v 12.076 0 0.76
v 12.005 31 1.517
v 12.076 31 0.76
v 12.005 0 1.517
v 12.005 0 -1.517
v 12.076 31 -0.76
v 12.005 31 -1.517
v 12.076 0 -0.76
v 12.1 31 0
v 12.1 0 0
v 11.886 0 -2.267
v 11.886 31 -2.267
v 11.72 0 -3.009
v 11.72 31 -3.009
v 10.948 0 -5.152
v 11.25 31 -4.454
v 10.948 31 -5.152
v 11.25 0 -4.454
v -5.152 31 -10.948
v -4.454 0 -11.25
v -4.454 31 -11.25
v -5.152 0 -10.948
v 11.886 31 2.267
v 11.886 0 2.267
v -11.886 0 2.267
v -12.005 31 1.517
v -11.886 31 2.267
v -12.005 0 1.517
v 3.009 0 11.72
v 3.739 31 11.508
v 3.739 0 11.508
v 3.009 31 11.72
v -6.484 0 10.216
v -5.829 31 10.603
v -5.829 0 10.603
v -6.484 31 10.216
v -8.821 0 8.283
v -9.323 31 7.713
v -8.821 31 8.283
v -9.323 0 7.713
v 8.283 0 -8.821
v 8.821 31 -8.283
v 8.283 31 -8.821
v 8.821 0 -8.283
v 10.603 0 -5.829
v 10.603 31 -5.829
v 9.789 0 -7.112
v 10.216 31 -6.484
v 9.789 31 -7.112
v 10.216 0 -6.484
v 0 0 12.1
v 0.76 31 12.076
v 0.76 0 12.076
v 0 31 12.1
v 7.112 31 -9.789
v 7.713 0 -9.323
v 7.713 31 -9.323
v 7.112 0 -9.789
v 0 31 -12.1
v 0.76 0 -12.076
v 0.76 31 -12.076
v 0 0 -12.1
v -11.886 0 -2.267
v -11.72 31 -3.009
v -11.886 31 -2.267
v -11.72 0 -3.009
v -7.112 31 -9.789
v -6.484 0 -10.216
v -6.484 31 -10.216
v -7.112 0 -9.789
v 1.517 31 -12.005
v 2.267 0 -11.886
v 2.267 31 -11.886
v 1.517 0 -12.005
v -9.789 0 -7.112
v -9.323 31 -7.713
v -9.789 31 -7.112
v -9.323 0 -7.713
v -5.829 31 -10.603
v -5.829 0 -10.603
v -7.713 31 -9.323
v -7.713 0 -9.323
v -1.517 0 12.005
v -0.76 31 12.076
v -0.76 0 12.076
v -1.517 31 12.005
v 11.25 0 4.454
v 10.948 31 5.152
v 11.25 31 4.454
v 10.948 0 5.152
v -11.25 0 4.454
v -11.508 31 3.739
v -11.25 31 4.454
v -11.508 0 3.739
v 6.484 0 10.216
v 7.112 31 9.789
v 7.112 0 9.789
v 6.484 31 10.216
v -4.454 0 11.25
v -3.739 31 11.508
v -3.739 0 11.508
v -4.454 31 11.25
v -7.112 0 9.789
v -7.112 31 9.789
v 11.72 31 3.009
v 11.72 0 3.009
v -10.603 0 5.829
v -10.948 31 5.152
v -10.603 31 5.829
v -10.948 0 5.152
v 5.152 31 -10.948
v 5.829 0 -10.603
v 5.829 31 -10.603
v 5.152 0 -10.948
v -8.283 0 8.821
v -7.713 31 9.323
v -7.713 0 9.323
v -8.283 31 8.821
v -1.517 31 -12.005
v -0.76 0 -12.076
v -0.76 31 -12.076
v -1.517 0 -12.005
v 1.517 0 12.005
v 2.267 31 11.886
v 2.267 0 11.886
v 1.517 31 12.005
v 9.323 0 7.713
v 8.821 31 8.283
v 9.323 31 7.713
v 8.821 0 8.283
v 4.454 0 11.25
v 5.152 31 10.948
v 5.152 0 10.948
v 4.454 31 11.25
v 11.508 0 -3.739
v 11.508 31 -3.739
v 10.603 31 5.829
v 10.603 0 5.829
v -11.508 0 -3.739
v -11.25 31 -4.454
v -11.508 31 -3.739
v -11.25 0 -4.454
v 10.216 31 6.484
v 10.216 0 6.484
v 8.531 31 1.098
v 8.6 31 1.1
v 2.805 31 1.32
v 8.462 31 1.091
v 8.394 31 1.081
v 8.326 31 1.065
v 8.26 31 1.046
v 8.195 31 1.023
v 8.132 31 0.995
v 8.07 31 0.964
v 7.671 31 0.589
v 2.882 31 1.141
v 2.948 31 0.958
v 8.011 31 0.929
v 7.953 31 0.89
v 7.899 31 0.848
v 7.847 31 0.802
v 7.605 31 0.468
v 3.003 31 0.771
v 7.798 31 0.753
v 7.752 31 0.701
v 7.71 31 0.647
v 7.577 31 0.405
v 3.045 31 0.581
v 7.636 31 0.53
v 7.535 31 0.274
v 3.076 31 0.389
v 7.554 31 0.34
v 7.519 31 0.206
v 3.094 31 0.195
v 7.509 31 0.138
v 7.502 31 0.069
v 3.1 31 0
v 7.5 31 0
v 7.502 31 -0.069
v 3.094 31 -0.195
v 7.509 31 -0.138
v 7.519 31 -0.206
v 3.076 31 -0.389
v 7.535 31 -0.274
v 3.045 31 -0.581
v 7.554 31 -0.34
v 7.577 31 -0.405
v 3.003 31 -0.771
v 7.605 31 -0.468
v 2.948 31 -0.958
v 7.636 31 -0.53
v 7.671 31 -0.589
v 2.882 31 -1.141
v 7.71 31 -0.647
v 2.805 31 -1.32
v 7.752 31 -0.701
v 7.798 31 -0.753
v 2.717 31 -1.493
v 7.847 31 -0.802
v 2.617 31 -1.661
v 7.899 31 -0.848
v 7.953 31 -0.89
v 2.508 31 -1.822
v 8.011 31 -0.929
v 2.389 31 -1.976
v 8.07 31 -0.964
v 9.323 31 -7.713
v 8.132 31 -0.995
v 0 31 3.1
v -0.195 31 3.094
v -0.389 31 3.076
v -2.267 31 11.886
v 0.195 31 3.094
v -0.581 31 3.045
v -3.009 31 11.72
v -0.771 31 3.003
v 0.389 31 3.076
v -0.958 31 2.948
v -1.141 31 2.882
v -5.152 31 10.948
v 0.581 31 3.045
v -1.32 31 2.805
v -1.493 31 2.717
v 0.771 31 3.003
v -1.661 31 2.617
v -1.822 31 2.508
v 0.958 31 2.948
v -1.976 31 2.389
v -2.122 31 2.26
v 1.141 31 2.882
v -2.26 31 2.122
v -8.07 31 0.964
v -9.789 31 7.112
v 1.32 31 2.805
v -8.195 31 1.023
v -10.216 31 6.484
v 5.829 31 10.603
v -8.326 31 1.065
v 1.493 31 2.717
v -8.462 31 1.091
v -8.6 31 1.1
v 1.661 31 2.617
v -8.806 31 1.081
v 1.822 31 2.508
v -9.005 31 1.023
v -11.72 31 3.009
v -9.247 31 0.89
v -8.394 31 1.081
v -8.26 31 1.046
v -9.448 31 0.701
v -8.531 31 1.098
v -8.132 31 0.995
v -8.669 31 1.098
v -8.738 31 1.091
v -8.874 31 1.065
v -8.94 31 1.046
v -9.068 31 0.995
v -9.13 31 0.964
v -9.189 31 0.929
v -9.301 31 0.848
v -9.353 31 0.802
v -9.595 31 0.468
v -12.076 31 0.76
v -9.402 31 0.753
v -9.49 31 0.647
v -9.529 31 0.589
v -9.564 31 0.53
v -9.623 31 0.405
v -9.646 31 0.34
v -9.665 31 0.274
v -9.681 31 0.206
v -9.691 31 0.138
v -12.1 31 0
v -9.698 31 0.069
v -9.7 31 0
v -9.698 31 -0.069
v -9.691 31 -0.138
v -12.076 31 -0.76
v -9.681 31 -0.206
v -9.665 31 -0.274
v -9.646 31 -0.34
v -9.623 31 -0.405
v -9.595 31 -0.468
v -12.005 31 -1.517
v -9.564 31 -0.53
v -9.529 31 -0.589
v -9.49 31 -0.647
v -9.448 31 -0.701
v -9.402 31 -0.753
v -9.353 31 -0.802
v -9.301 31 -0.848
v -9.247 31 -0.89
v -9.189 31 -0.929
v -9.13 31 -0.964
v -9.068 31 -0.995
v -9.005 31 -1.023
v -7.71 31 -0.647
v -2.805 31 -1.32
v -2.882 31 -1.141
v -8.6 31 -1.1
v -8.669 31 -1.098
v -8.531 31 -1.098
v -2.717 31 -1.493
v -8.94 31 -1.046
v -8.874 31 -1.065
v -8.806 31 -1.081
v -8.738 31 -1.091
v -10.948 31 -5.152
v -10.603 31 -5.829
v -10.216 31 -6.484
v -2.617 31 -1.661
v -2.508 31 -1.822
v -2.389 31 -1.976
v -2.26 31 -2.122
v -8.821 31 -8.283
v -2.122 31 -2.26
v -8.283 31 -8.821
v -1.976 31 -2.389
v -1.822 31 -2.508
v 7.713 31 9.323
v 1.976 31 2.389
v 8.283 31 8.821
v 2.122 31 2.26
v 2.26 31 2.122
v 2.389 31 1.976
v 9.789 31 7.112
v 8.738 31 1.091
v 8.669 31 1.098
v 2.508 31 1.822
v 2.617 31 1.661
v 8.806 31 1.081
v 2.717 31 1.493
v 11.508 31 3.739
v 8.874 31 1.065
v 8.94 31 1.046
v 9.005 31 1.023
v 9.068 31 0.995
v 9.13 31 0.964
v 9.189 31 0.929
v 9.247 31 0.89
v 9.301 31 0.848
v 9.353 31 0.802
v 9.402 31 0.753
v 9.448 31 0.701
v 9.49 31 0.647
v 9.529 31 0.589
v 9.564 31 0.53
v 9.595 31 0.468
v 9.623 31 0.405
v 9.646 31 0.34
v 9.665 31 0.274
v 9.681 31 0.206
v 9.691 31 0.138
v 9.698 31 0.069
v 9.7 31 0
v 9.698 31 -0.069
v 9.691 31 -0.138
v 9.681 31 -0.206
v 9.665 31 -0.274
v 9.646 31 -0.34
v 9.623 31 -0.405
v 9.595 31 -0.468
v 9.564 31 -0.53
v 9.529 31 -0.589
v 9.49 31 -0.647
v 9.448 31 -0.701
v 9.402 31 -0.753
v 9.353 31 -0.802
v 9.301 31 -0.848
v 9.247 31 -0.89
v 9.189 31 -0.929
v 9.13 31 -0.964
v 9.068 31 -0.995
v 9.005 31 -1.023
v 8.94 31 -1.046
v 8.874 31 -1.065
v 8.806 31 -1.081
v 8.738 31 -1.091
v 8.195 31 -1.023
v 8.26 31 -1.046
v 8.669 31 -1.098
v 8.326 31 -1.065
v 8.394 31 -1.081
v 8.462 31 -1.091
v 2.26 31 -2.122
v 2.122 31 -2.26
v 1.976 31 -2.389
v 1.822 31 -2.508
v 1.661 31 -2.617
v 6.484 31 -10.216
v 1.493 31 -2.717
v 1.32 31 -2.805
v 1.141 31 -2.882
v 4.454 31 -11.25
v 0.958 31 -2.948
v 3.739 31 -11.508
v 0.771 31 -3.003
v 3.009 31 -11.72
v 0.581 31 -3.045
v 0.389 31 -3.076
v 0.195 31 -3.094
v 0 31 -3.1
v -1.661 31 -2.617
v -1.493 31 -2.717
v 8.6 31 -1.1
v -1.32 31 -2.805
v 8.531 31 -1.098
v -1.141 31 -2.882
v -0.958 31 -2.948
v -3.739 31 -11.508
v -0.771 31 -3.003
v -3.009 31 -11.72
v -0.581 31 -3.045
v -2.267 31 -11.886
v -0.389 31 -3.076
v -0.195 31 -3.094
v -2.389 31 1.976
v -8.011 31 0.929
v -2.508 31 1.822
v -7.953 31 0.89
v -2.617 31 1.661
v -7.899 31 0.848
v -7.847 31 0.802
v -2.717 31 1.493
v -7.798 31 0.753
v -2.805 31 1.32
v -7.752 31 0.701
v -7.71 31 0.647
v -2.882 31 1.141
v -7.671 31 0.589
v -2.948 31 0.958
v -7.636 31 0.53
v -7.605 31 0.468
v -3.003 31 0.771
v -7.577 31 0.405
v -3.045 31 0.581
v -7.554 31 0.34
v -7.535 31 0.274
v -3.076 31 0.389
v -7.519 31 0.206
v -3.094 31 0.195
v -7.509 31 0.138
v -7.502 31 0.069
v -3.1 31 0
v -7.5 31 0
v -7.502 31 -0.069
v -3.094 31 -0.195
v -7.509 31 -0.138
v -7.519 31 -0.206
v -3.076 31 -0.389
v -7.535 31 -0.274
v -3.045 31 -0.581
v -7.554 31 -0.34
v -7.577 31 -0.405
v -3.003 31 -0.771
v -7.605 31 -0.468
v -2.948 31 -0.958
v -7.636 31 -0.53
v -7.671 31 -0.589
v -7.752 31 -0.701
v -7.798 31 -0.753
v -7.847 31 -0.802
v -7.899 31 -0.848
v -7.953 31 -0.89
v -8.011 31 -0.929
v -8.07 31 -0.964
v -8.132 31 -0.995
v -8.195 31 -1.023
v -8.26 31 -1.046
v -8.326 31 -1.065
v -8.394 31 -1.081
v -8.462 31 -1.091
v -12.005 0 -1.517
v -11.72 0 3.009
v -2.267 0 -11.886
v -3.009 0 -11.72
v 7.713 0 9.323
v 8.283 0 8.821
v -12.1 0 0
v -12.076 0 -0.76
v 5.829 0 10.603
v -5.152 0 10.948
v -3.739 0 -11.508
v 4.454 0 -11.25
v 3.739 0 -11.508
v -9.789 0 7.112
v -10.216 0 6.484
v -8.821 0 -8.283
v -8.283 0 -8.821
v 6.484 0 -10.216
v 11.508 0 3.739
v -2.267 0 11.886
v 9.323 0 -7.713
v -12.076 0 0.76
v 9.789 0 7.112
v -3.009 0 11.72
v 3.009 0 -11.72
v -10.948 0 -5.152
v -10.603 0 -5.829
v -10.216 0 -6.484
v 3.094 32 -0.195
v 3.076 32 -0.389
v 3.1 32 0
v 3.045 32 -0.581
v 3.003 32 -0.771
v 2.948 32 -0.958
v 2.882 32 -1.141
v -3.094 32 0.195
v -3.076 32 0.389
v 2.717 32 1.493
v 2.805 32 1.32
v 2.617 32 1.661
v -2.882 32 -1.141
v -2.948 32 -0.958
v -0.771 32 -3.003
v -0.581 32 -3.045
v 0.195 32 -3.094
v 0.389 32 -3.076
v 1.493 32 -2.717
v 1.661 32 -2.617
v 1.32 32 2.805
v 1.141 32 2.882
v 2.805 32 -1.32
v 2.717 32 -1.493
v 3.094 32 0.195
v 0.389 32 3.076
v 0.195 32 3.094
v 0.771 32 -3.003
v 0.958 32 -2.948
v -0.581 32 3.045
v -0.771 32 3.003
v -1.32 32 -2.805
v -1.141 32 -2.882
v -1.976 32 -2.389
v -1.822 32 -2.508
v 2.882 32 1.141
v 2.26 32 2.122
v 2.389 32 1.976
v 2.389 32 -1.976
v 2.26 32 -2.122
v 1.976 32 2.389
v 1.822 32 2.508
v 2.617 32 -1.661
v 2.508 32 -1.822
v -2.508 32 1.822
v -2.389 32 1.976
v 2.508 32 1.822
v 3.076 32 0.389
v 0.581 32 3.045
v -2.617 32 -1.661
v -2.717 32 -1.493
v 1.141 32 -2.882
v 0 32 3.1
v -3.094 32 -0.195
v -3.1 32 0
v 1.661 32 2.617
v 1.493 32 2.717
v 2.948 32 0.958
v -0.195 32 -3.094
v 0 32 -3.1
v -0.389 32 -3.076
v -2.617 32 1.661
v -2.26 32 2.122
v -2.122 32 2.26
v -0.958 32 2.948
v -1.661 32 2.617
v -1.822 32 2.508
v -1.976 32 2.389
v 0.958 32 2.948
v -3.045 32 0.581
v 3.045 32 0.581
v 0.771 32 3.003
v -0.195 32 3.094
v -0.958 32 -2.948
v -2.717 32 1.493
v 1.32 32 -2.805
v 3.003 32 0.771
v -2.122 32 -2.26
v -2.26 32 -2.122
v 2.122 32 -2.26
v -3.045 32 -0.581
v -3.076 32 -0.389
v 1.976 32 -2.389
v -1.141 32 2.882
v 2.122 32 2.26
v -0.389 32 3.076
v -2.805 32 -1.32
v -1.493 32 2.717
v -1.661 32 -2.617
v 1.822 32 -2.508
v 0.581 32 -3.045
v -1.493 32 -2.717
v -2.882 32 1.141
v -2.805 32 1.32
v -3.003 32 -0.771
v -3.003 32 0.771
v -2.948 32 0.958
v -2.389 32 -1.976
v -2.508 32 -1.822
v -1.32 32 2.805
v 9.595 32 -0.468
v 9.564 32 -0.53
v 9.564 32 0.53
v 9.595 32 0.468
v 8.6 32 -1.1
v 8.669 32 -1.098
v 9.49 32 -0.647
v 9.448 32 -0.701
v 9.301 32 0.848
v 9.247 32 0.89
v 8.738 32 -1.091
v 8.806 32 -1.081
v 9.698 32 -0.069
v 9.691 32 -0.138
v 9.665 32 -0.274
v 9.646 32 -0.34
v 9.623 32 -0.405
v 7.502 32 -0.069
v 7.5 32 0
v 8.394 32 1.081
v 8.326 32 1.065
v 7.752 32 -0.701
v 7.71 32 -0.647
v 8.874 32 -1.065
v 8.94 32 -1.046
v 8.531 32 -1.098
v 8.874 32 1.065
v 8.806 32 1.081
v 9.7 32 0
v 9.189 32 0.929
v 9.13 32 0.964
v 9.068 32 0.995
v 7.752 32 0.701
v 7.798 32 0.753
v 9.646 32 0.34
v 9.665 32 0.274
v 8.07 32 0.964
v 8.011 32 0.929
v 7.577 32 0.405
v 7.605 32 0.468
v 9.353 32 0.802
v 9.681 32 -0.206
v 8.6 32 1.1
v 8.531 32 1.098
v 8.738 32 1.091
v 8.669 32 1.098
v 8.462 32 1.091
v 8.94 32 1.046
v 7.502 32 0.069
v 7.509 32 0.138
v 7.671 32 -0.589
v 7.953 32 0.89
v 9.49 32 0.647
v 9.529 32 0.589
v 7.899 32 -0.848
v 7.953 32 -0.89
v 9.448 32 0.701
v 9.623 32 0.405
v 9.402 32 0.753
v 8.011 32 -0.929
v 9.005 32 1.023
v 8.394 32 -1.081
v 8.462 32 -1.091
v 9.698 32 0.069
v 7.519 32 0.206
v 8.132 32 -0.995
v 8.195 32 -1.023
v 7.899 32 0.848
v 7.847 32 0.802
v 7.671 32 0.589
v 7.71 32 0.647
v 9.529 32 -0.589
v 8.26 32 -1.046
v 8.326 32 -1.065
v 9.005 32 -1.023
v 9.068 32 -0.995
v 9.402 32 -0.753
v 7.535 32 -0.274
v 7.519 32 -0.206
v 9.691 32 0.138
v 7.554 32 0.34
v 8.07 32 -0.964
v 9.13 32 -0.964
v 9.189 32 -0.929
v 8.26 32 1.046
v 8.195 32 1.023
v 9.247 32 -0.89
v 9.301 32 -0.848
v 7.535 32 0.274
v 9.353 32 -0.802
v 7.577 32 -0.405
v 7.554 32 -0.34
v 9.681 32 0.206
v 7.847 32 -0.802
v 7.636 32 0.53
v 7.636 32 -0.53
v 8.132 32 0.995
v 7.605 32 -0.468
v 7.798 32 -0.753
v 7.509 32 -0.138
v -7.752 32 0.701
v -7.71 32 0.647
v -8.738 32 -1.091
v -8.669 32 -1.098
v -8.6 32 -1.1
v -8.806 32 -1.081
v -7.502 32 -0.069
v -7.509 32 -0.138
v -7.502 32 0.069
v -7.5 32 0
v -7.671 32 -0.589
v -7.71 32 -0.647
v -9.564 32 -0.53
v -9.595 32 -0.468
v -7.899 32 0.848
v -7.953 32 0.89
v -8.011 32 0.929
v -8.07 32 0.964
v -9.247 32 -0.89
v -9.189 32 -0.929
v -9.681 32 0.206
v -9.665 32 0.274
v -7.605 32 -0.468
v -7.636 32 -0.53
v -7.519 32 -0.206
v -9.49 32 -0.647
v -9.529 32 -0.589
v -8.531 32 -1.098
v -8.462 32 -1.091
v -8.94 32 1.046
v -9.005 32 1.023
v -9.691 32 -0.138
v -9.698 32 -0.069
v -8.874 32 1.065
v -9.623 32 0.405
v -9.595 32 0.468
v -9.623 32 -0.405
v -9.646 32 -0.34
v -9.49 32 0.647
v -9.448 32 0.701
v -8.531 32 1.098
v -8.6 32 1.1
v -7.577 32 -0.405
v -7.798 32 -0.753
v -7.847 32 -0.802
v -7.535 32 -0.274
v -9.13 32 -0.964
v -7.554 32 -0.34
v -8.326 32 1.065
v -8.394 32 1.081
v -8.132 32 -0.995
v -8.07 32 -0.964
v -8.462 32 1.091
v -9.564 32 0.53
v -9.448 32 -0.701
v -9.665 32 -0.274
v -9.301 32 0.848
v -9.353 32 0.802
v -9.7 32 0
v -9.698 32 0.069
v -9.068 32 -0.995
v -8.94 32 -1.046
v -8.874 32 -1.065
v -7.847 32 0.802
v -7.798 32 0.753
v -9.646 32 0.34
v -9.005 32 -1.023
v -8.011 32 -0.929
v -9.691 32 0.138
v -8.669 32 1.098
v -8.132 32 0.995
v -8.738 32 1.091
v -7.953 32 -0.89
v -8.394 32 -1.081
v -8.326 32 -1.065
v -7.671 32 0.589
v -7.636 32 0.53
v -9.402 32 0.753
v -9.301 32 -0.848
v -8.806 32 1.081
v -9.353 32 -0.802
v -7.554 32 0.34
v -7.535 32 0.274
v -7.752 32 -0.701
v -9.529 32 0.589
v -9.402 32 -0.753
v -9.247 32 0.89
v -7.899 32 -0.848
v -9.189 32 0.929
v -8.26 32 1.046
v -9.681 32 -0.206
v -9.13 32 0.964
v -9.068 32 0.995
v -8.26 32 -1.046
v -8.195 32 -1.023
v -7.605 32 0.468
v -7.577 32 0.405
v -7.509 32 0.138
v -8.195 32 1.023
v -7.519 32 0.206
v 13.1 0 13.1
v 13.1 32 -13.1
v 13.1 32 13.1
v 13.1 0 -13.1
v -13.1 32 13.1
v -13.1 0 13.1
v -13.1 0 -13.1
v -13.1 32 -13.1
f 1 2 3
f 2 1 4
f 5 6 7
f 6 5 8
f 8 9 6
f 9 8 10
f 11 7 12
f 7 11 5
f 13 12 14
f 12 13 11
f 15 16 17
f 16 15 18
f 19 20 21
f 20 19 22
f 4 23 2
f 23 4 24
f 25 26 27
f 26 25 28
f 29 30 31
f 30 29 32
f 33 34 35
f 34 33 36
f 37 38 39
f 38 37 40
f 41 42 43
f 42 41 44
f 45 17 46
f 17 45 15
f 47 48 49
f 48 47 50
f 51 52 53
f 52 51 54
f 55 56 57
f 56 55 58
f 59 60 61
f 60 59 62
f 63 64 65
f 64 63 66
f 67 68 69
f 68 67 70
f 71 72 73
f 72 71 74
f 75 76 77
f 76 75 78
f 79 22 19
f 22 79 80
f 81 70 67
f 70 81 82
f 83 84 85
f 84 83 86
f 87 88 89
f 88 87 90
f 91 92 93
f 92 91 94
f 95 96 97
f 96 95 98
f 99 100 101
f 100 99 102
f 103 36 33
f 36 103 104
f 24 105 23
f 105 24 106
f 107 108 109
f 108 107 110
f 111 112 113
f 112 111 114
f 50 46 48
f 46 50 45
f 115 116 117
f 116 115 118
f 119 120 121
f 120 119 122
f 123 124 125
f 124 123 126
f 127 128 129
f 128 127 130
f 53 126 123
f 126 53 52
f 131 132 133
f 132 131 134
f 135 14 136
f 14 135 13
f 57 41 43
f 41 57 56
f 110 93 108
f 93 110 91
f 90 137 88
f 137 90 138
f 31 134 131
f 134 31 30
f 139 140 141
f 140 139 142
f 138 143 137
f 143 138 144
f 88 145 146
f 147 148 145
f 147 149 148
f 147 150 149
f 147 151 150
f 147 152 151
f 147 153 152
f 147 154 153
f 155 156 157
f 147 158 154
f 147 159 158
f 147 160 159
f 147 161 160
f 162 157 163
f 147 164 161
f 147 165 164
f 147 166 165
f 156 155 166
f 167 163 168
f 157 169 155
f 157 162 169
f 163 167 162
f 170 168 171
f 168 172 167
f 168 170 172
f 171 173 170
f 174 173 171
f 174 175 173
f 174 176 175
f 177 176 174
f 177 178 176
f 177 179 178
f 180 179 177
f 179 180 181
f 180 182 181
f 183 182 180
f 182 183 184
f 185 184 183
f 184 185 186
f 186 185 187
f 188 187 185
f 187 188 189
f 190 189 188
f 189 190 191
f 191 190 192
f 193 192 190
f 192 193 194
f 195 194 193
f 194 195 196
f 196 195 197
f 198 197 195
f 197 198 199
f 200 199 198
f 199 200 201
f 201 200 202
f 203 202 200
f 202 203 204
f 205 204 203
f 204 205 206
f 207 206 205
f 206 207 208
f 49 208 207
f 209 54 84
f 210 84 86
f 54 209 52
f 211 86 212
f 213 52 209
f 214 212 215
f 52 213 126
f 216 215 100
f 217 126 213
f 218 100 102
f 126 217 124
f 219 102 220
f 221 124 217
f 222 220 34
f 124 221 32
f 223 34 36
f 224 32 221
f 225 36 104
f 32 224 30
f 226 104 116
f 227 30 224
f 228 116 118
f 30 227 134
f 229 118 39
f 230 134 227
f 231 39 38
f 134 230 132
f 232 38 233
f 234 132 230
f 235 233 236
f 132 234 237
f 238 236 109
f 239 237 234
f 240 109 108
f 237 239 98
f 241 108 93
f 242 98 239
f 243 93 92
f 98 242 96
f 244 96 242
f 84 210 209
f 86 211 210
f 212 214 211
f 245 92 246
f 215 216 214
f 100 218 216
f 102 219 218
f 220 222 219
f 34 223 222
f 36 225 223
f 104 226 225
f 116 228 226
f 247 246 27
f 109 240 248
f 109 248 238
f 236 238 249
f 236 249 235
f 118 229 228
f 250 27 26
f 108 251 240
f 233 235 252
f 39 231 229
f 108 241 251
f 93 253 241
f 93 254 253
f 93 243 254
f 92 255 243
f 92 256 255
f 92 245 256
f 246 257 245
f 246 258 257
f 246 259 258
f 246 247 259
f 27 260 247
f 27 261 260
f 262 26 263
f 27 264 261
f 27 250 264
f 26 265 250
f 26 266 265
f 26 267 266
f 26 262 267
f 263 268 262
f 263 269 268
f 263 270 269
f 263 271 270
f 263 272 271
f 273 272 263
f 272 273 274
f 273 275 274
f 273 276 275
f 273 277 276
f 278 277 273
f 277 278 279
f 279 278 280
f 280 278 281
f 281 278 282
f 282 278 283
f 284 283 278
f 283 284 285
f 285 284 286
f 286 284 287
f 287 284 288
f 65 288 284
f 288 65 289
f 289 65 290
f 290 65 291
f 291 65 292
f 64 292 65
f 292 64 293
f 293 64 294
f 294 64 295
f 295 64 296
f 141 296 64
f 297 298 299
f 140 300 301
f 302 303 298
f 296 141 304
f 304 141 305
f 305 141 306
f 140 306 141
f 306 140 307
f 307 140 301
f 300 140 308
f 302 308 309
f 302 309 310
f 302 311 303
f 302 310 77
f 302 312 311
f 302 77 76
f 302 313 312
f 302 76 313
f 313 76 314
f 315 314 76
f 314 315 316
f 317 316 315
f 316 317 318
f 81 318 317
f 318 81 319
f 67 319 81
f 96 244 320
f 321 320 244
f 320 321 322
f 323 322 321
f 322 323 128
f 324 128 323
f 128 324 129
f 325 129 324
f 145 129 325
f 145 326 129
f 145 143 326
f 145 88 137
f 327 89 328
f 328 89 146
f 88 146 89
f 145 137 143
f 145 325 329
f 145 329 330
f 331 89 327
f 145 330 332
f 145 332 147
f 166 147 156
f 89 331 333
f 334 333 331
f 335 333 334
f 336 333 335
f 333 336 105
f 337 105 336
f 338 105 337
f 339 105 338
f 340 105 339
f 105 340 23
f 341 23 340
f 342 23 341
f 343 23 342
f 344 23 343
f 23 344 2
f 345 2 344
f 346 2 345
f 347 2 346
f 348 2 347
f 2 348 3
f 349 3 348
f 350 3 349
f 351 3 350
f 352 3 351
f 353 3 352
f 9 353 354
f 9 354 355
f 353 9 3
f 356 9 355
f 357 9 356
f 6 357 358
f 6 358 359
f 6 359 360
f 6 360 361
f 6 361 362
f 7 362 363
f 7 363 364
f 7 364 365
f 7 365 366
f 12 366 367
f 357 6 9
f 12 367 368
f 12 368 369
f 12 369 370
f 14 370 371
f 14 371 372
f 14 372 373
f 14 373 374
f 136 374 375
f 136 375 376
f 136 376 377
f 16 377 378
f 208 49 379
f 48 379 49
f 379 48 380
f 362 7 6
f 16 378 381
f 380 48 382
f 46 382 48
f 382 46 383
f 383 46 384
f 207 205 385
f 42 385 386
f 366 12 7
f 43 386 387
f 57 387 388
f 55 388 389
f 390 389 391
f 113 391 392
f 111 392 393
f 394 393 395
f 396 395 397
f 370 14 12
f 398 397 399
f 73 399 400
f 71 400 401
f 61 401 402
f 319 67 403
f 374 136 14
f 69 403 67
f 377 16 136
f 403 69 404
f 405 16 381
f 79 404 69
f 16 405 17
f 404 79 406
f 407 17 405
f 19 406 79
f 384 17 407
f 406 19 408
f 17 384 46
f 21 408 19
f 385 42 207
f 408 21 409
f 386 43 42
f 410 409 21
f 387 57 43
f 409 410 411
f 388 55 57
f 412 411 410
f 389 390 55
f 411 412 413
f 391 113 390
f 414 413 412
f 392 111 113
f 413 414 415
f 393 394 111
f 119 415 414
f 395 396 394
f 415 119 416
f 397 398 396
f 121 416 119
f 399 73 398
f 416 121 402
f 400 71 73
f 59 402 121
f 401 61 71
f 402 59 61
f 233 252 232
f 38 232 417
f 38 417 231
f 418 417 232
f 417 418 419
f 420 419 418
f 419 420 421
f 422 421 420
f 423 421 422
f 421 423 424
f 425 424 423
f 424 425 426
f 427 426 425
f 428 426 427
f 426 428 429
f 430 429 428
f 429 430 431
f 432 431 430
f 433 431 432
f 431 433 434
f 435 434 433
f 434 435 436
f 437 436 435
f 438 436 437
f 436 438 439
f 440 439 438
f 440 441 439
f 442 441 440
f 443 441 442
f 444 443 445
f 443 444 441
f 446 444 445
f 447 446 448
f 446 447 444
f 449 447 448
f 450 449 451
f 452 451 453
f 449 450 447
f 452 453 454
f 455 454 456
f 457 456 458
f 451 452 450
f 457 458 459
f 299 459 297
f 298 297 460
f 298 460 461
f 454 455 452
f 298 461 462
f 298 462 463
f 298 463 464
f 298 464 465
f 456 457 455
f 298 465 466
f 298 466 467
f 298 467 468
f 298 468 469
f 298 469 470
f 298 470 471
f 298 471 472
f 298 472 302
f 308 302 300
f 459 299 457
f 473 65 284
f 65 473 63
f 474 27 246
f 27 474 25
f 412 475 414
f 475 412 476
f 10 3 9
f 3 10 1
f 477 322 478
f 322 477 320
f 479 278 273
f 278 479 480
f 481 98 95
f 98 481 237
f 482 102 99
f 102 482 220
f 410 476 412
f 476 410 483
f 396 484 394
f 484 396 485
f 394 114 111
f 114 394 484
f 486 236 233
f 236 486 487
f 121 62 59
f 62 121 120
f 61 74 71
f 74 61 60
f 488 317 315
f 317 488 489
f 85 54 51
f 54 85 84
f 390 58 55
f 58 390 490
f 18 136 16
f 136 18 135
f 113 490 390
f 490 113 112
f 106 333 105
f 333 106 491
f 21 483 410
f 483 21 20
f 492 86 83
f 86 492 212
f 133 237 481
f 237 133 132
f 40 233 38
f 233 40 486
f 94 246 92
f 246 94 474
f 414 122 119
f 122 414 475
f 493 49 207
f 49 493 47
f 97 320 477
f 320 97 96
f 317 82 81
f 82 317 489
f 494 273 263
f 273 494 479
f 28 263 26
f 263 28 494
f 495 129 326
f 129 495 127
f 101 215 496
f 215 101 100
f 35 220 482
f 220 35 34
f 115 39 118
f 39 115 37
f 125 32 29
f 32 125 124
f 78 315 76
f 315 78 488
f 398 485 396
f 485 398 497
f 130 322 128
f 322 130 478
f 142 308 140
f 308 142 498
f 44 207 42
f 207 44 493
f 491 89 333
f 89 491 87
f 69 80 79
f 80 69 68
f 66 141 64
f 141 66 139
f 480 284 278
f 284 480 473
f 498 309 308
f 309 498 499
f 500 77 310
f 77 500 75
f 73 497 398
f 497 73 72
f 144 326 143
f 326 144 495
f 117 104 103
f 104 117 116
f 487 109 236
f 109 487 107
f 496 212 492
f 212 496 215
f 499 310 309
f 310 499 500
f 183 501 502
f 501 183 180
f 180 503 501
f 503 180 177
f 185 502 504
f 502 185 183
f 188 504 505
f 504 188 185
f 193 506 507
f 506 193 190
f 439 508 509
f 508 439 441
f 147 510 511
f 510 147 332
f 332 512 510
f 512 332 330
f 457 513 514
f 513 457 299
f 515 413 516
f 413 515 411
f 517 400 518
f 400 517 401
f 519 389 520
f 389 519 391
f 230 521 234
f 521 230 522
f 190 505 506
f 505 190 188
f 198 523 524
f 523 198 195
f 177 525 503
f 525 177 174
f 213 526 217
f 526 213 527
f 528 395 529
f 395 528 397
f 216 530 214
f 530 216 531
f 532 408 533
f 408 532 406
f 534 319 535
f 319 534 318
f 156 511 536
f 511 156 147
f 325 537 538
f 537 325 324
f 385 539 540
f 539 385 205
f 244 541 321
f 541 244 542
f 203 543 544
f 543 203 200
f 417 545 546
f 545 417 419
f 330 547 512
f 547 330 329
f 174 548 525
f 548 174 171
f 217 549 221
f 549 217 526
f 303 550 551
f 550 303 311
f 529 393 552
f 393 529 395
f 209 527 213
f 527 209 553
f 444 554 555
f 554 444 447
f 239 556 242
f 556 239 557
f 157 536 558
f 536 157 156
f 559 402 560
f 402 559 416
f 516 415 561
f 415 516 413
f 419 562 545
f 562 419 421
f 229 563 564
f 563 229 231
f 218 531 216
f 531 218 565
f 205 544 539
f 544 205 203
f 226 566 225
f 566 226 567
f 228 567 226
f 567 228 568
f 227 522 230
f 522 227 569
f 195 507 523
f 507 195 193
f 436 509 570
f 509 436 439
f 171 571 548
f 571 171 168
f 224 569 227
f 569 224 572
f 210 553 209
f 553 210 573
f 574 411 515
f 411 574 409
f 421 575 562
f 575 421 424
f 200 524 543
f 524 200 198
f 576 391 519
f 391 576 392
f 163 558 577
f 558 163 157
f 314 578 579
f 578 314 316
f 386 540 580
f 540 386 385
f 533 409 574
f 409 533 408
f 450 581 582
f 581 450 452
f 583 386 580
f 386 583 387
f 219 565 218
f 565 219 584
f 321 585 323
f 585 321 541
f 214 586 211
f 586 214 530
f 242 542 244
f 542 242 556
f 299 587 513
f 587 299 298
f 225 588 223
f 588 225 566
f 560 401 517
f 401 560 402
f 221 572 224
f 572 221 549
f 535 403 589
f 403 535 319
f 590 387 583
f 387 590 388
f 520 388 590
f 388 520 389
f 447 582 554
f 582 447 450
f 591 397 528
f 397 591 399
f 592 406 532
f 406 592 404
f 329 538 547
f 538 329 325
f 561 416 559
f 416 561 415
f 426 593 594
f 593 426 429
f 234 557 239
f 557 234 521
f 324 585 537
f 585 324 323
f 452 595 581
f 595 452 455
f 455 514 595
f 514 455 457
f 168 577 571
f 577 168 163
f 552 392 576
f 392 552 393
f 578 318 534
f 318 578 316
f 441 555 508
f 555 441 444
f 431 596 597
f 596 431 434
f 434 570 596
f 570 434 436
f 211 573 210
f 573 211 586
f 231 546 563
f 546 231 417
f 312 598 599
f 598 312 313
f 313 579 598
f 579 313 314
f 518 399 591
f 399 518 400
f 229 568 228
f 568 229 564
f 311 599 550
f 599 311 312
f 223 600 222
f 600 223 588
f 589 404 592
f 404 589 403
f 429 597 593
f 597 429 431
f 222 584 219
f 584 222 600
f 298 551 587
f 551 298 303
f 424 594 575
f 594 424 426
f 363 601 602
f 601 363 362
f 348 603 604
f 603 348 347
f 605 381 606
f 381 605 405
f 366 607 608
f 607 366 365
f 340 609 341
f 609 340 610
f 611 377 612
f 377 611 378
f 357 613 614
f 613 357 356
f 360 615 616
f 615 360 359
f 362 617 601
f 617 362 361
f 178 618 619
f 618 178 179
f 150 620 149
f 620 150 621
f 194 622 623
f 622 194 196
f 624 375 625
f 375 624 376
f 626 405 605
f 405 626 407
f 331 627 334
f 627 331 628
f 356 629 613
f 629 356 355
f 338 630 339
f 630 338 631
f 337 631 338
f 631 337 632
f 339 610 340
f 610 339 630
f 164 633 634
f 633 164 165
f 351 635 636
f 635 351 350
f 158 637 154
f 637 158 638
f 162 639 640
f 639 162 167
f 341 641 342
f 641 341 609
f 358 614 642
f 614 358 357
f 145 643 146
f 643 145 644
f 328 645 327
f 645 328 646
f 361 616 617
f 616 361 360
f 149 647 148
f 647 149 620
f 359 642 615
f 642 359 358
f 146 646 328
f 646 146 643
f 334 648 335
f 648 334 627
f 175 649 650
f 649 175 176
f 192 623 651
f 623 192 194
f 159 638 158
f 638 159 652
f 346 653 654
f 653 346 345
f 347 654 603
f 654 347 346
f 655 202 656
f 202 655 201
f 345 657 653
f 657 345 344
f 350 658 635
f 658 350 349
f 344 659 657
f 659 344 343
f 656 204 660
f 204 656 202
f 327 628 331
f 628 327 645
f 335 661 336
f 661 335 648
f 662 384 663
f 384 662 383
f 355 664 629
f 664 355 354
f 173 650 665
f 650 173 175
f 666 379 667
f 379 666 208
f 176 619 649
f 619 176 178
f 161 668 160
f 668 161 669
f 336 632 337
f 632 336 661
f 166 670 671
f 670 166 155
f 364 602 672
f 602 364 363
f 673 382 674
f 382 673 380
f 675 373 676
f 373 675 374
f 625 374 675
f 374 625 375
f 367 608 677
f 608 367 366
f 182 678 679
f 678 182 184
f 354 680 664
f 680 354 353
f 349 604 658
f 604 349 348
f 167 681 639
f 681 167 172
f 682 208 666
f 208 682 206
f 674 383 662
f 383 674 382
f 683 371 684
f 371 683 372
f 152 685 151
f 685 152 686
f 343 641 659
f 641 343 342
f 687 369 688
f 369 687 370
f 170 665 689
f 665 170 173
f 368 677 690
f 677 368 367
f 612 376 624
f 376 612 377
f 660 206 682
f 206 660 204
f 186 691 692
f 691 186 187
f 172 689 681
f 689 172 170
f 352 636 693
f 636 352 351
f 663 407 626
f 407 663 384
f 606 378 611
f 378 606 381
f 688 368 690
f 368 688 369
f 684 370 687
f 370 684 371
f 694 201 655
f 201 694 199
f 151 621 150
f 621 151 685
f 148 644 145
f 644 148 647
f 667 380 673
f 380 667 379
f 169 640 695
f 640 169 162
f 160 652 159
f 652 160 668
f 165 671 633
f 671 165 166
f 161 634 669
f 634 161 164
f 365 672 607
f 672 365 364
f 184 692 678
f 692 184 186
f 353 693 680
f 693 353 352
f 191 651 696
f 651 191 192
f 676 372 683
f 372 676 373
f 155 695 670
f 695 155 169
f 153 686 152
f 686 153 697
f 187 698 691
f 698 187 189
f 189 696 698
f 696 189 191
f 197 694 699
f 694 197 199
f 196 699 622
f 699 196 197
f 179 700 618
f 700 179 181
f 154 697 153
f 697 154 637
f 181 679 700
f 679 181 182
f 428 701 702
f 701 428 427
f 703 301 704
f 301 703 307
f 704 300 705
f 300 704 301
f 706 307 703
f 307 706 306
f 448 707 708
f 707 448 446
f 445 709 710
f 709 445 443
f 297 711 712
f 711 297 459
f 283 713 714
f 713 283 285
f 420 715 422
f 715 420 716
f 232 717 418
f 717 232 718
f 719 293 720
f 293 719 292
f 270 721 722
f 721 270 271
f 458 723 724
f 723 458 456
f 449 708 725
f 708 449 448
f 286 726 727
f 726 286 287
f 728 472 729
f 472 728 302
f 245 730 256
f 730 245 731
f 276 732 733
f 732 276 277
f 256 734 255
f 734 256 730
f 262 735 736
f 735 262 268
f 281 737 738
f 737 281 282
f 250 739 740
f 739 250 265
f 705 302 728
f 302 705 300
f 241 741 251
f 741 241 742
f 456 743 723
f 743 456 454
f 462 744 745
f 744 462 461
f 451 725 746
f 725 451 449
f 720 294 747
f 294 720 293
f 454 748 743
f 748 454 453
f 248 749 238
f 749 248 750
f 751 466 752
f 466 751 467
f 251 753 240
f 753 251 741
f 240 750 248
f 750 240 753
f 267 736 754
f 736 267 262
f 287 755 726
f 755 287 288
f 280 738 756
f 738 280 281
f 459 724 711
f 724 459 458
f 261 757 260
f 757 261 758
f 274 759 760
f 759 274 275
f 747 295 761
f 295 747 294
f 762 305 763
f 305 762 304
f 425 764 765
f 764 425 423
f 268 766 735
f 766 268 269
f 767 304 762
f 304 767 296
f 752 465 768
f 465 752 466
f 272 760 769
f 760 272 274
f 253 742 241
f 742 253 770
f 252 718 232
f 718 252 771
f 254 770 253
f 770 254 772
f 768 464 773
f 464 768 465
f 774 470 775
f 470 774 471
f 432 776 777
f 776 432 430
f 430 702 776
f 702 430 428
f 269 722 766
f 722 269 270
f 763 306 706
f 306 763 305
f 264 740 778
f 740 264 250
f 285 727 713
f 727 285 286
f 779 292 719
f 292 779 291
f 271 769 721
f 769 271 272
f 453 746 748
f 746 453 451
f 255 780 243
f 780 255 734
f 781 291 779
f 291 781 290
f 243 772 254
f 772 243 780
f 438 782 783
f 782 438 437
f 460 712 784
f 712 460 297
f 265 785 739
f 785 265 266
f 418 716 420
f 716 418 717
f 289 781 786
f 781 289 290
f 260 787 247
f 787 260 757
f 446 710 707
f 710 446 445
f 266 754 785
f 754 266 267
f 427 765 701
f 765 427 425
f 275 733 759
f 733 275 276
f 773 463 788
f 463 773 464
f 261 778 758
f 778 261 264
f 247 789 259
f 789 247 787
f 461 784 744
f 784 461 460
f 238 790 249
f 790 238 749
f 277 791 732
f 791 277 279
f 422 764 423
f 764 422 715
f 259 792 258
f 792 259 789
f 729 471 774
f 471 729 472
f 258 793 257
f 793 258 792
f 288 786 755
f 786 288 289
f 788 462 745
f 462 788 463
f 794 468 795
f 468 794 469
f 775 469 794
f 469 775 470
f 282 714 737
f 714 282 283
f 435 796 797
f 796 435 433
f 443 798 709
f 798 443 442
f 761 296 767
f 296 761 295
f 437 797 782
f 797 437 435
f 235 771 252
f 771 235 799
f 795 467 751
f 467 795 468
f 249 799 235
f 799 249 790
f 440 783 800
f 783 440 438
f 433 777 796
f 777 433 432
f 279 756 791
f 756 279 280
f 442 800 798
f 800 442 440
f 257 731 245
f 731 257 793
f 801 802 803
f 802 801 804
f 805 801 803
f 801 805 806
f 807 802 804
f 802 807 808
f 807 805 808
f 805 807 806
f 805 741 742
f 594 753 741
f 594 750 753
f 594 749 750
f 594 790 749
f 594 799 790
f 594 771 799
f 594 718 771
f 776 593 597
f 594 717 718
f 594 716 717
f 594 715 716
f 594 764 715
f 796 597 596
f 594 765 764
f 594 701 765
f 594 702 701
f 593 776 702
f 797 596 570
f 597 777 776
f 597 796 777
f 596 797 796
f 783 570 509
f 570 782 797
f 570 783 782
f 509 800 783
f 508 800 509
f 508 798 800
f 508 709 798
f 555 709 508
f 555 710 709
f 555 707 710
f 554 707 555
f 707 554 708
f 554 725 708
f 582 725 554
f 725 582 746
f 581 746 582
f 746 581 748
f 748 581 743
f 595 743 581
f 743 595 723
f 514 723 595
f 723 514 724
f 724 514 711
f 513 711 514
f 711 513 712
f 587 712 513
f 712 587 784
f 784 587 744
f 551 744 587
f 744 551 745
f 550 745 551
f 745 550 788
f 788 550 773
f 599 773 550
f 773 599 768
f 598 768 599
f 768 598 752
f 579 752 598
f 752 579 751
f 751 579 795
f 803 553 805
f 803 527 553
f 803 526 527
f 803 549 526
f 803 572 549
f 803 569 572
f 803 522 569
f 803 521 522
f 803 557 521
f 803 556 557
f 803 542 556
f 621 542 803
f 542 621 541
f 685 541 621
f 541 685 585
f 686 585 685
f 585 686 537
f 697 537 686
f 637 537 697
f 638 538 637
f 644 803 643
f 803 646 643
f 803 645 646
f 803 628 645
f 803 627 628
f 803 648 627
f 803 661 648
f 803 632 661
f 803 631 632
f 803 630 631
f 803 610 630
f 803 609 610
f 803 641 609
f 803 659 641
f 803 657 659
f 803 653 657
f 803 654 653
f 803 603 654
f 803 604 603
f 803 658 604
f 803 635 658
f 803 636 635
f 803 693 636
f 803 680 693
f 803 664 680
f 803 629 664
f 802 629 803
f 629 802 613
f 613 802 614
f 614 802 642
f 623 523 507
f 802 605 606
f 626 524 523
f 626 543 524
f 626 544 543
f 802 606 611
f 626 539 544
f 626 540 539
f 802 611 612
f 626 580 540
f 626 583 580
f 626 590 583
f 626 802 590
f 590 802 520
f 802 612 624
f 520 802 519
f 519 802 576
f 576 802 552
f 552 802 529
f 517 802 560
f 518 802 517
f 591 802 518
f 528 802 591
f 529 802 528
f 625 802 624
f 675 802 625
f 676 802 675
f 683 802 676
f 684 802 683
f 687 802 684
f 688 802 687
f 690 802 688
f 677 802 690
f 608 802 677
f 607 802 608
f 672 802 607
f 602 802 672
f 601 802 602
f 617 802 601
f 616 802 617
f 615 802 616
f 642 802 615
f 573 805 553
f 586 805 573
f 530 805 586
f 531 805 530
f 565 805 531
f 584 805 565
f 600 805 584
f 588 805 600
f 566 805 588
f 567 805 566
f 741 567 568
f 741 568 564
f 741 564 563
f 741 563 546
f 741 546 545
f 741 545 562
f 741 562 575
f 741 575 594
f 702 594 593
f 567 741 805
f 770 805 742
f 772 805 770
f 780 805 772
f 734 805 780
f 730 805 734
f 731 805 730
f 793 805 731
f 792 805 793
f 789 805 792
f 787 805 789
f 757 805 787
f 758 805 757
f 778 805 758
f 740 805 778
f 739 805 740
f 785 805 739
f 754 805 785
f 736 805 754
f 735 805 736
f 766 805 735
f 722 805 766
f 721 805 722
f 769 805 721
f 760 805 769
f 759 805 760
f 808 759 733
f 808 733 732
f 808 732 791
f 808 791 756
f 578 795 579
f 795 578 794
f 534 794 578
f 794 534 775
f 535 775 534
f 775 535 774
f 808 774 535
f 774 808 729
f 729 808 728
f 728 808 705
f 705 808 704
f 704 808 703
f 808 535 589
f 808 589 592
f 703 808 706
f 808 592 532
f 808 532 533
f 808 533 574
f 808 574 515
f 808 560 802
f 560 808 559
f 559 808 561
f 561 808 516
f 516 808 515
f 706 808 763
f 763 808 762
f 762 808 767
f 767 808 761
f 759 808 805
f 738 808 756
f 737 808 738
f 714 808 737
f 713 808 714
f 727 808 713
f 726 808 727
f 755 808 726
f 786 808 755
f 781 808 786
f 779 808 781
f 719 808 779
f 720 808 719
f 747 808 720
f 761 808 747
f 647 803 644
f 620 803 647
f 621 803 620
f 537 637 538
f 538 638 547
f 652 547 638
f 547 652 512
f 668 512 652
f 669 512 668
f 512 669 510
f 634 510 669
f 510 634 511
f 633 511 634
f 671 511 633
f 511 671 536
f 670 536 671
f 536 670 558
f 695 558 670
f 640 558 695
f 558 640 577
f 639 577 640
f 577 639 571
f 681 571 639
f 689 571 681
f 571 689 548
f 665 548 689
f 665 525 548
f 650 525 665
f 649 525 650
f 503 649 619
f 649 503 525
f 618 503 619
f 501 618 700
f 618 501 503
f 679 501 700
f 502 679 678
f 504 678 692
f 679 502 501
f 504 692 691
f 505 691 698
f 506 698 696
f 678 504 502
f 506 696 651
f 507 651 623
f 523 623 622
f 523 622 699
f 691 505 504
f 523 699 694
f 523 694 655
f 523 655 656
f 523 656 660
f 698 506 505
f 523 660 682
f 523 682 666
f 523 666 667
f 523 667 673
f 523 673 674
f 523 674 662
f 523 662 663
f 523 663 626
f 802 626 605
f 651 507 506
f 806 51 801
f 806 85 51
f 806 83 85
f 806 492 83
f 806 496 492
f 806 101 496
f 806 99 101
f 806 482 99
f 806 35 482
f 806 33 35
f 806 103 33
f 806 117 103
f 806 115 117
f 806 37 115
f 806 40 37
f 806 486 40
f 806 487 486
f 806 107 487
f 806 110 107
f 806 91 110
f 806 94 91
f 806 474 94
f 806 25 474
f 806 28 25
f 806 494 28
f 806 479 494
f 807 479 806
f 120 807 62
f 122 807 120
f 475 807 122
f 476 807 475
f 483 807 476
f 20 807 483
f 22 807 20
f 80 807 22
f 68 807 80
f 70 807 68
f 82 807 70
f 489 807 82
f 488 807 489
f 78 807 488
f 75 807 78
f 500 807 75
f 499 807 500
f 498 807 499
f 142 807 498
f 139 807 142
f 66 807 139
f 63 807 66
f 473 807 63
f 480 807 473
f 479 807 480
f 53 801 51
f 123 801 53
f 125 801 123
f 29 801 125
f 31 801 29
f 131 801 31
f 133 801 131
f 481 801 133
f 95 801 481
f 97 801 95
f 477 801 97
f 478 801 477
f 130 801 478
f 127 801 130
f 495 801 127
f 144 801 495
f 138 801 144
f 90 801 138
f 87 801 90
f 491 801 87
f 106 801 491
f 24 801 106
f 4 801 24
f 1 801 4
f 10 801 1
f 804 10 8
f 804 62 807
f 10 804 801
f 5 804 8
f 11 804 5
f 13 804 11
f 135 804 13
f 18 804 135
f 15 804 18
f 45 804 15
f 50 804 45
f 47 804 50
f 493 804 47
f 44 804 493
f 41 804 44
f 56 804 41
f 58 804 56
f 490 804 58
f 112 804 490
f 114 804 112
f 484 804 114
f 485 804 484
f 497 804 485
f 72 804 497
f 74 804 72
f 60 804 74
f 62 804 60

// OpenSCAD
//  Measure for smoothness
$fn = 100;

//  Tolerance on the radius
tolerance = 0.1;

motorRadius = 24 / 2;
motorLength = 31;
wallThickness = 1;
cutOutRadius = 6 / 2;
//  Amount of holes for screws
screwMounts = 2;
//  Distance from holes to ax
screwAx = 17.2 / 2;
screwRadius = 2 / 2;

//  Mount opened on the top, 0 for no, 1 for yes
topOpen = 0;    //  [1, 0]

module motorMount(){
    difference(){
        translate(  [   -(motorRadius + wallThickness + tolerance),
                        0,
                        -(motorRadius + wallThickness + tolerance)]){
            cube(   [   2 * (motorRadius + wallThickness + tolerance),
                        motorLength + wallThickness,
                        2 * (motorRadius + wallThickness + tolerance)],
                    center = false);
        }
        if(topOpen == 1){
            translate(  [   -(motorRadius + tolerance),
                            -0.1,
                            0]){
                cube(   [   2 * (motorRadius + tolerance),
                            motorLength + 0.1,
                            2 * (motorRadius + wallThickness + tolerance)],
                        center = false);
            }
        }
        rotate([-90,0,0]){
            translate([0,0,-0.1]){
                cylinder(r = motorRadius + tolerance, h = motorLength + 0.1);
                cylinder(r = cutOutRadius + tolerance, h = motorLength + wallThickness + 0.2);
            }
            for(i = [1:screwMounts]){
                rotate([0,0,360 / screwMounts * i + 90]){
                    translate([0,screwAx,0]){
                        cylinder(r = screwRadius + tolerance, h = motorLength + wallThickness + 0.2);
                    }
                }
            }
        }
    }
}

motorMount();
